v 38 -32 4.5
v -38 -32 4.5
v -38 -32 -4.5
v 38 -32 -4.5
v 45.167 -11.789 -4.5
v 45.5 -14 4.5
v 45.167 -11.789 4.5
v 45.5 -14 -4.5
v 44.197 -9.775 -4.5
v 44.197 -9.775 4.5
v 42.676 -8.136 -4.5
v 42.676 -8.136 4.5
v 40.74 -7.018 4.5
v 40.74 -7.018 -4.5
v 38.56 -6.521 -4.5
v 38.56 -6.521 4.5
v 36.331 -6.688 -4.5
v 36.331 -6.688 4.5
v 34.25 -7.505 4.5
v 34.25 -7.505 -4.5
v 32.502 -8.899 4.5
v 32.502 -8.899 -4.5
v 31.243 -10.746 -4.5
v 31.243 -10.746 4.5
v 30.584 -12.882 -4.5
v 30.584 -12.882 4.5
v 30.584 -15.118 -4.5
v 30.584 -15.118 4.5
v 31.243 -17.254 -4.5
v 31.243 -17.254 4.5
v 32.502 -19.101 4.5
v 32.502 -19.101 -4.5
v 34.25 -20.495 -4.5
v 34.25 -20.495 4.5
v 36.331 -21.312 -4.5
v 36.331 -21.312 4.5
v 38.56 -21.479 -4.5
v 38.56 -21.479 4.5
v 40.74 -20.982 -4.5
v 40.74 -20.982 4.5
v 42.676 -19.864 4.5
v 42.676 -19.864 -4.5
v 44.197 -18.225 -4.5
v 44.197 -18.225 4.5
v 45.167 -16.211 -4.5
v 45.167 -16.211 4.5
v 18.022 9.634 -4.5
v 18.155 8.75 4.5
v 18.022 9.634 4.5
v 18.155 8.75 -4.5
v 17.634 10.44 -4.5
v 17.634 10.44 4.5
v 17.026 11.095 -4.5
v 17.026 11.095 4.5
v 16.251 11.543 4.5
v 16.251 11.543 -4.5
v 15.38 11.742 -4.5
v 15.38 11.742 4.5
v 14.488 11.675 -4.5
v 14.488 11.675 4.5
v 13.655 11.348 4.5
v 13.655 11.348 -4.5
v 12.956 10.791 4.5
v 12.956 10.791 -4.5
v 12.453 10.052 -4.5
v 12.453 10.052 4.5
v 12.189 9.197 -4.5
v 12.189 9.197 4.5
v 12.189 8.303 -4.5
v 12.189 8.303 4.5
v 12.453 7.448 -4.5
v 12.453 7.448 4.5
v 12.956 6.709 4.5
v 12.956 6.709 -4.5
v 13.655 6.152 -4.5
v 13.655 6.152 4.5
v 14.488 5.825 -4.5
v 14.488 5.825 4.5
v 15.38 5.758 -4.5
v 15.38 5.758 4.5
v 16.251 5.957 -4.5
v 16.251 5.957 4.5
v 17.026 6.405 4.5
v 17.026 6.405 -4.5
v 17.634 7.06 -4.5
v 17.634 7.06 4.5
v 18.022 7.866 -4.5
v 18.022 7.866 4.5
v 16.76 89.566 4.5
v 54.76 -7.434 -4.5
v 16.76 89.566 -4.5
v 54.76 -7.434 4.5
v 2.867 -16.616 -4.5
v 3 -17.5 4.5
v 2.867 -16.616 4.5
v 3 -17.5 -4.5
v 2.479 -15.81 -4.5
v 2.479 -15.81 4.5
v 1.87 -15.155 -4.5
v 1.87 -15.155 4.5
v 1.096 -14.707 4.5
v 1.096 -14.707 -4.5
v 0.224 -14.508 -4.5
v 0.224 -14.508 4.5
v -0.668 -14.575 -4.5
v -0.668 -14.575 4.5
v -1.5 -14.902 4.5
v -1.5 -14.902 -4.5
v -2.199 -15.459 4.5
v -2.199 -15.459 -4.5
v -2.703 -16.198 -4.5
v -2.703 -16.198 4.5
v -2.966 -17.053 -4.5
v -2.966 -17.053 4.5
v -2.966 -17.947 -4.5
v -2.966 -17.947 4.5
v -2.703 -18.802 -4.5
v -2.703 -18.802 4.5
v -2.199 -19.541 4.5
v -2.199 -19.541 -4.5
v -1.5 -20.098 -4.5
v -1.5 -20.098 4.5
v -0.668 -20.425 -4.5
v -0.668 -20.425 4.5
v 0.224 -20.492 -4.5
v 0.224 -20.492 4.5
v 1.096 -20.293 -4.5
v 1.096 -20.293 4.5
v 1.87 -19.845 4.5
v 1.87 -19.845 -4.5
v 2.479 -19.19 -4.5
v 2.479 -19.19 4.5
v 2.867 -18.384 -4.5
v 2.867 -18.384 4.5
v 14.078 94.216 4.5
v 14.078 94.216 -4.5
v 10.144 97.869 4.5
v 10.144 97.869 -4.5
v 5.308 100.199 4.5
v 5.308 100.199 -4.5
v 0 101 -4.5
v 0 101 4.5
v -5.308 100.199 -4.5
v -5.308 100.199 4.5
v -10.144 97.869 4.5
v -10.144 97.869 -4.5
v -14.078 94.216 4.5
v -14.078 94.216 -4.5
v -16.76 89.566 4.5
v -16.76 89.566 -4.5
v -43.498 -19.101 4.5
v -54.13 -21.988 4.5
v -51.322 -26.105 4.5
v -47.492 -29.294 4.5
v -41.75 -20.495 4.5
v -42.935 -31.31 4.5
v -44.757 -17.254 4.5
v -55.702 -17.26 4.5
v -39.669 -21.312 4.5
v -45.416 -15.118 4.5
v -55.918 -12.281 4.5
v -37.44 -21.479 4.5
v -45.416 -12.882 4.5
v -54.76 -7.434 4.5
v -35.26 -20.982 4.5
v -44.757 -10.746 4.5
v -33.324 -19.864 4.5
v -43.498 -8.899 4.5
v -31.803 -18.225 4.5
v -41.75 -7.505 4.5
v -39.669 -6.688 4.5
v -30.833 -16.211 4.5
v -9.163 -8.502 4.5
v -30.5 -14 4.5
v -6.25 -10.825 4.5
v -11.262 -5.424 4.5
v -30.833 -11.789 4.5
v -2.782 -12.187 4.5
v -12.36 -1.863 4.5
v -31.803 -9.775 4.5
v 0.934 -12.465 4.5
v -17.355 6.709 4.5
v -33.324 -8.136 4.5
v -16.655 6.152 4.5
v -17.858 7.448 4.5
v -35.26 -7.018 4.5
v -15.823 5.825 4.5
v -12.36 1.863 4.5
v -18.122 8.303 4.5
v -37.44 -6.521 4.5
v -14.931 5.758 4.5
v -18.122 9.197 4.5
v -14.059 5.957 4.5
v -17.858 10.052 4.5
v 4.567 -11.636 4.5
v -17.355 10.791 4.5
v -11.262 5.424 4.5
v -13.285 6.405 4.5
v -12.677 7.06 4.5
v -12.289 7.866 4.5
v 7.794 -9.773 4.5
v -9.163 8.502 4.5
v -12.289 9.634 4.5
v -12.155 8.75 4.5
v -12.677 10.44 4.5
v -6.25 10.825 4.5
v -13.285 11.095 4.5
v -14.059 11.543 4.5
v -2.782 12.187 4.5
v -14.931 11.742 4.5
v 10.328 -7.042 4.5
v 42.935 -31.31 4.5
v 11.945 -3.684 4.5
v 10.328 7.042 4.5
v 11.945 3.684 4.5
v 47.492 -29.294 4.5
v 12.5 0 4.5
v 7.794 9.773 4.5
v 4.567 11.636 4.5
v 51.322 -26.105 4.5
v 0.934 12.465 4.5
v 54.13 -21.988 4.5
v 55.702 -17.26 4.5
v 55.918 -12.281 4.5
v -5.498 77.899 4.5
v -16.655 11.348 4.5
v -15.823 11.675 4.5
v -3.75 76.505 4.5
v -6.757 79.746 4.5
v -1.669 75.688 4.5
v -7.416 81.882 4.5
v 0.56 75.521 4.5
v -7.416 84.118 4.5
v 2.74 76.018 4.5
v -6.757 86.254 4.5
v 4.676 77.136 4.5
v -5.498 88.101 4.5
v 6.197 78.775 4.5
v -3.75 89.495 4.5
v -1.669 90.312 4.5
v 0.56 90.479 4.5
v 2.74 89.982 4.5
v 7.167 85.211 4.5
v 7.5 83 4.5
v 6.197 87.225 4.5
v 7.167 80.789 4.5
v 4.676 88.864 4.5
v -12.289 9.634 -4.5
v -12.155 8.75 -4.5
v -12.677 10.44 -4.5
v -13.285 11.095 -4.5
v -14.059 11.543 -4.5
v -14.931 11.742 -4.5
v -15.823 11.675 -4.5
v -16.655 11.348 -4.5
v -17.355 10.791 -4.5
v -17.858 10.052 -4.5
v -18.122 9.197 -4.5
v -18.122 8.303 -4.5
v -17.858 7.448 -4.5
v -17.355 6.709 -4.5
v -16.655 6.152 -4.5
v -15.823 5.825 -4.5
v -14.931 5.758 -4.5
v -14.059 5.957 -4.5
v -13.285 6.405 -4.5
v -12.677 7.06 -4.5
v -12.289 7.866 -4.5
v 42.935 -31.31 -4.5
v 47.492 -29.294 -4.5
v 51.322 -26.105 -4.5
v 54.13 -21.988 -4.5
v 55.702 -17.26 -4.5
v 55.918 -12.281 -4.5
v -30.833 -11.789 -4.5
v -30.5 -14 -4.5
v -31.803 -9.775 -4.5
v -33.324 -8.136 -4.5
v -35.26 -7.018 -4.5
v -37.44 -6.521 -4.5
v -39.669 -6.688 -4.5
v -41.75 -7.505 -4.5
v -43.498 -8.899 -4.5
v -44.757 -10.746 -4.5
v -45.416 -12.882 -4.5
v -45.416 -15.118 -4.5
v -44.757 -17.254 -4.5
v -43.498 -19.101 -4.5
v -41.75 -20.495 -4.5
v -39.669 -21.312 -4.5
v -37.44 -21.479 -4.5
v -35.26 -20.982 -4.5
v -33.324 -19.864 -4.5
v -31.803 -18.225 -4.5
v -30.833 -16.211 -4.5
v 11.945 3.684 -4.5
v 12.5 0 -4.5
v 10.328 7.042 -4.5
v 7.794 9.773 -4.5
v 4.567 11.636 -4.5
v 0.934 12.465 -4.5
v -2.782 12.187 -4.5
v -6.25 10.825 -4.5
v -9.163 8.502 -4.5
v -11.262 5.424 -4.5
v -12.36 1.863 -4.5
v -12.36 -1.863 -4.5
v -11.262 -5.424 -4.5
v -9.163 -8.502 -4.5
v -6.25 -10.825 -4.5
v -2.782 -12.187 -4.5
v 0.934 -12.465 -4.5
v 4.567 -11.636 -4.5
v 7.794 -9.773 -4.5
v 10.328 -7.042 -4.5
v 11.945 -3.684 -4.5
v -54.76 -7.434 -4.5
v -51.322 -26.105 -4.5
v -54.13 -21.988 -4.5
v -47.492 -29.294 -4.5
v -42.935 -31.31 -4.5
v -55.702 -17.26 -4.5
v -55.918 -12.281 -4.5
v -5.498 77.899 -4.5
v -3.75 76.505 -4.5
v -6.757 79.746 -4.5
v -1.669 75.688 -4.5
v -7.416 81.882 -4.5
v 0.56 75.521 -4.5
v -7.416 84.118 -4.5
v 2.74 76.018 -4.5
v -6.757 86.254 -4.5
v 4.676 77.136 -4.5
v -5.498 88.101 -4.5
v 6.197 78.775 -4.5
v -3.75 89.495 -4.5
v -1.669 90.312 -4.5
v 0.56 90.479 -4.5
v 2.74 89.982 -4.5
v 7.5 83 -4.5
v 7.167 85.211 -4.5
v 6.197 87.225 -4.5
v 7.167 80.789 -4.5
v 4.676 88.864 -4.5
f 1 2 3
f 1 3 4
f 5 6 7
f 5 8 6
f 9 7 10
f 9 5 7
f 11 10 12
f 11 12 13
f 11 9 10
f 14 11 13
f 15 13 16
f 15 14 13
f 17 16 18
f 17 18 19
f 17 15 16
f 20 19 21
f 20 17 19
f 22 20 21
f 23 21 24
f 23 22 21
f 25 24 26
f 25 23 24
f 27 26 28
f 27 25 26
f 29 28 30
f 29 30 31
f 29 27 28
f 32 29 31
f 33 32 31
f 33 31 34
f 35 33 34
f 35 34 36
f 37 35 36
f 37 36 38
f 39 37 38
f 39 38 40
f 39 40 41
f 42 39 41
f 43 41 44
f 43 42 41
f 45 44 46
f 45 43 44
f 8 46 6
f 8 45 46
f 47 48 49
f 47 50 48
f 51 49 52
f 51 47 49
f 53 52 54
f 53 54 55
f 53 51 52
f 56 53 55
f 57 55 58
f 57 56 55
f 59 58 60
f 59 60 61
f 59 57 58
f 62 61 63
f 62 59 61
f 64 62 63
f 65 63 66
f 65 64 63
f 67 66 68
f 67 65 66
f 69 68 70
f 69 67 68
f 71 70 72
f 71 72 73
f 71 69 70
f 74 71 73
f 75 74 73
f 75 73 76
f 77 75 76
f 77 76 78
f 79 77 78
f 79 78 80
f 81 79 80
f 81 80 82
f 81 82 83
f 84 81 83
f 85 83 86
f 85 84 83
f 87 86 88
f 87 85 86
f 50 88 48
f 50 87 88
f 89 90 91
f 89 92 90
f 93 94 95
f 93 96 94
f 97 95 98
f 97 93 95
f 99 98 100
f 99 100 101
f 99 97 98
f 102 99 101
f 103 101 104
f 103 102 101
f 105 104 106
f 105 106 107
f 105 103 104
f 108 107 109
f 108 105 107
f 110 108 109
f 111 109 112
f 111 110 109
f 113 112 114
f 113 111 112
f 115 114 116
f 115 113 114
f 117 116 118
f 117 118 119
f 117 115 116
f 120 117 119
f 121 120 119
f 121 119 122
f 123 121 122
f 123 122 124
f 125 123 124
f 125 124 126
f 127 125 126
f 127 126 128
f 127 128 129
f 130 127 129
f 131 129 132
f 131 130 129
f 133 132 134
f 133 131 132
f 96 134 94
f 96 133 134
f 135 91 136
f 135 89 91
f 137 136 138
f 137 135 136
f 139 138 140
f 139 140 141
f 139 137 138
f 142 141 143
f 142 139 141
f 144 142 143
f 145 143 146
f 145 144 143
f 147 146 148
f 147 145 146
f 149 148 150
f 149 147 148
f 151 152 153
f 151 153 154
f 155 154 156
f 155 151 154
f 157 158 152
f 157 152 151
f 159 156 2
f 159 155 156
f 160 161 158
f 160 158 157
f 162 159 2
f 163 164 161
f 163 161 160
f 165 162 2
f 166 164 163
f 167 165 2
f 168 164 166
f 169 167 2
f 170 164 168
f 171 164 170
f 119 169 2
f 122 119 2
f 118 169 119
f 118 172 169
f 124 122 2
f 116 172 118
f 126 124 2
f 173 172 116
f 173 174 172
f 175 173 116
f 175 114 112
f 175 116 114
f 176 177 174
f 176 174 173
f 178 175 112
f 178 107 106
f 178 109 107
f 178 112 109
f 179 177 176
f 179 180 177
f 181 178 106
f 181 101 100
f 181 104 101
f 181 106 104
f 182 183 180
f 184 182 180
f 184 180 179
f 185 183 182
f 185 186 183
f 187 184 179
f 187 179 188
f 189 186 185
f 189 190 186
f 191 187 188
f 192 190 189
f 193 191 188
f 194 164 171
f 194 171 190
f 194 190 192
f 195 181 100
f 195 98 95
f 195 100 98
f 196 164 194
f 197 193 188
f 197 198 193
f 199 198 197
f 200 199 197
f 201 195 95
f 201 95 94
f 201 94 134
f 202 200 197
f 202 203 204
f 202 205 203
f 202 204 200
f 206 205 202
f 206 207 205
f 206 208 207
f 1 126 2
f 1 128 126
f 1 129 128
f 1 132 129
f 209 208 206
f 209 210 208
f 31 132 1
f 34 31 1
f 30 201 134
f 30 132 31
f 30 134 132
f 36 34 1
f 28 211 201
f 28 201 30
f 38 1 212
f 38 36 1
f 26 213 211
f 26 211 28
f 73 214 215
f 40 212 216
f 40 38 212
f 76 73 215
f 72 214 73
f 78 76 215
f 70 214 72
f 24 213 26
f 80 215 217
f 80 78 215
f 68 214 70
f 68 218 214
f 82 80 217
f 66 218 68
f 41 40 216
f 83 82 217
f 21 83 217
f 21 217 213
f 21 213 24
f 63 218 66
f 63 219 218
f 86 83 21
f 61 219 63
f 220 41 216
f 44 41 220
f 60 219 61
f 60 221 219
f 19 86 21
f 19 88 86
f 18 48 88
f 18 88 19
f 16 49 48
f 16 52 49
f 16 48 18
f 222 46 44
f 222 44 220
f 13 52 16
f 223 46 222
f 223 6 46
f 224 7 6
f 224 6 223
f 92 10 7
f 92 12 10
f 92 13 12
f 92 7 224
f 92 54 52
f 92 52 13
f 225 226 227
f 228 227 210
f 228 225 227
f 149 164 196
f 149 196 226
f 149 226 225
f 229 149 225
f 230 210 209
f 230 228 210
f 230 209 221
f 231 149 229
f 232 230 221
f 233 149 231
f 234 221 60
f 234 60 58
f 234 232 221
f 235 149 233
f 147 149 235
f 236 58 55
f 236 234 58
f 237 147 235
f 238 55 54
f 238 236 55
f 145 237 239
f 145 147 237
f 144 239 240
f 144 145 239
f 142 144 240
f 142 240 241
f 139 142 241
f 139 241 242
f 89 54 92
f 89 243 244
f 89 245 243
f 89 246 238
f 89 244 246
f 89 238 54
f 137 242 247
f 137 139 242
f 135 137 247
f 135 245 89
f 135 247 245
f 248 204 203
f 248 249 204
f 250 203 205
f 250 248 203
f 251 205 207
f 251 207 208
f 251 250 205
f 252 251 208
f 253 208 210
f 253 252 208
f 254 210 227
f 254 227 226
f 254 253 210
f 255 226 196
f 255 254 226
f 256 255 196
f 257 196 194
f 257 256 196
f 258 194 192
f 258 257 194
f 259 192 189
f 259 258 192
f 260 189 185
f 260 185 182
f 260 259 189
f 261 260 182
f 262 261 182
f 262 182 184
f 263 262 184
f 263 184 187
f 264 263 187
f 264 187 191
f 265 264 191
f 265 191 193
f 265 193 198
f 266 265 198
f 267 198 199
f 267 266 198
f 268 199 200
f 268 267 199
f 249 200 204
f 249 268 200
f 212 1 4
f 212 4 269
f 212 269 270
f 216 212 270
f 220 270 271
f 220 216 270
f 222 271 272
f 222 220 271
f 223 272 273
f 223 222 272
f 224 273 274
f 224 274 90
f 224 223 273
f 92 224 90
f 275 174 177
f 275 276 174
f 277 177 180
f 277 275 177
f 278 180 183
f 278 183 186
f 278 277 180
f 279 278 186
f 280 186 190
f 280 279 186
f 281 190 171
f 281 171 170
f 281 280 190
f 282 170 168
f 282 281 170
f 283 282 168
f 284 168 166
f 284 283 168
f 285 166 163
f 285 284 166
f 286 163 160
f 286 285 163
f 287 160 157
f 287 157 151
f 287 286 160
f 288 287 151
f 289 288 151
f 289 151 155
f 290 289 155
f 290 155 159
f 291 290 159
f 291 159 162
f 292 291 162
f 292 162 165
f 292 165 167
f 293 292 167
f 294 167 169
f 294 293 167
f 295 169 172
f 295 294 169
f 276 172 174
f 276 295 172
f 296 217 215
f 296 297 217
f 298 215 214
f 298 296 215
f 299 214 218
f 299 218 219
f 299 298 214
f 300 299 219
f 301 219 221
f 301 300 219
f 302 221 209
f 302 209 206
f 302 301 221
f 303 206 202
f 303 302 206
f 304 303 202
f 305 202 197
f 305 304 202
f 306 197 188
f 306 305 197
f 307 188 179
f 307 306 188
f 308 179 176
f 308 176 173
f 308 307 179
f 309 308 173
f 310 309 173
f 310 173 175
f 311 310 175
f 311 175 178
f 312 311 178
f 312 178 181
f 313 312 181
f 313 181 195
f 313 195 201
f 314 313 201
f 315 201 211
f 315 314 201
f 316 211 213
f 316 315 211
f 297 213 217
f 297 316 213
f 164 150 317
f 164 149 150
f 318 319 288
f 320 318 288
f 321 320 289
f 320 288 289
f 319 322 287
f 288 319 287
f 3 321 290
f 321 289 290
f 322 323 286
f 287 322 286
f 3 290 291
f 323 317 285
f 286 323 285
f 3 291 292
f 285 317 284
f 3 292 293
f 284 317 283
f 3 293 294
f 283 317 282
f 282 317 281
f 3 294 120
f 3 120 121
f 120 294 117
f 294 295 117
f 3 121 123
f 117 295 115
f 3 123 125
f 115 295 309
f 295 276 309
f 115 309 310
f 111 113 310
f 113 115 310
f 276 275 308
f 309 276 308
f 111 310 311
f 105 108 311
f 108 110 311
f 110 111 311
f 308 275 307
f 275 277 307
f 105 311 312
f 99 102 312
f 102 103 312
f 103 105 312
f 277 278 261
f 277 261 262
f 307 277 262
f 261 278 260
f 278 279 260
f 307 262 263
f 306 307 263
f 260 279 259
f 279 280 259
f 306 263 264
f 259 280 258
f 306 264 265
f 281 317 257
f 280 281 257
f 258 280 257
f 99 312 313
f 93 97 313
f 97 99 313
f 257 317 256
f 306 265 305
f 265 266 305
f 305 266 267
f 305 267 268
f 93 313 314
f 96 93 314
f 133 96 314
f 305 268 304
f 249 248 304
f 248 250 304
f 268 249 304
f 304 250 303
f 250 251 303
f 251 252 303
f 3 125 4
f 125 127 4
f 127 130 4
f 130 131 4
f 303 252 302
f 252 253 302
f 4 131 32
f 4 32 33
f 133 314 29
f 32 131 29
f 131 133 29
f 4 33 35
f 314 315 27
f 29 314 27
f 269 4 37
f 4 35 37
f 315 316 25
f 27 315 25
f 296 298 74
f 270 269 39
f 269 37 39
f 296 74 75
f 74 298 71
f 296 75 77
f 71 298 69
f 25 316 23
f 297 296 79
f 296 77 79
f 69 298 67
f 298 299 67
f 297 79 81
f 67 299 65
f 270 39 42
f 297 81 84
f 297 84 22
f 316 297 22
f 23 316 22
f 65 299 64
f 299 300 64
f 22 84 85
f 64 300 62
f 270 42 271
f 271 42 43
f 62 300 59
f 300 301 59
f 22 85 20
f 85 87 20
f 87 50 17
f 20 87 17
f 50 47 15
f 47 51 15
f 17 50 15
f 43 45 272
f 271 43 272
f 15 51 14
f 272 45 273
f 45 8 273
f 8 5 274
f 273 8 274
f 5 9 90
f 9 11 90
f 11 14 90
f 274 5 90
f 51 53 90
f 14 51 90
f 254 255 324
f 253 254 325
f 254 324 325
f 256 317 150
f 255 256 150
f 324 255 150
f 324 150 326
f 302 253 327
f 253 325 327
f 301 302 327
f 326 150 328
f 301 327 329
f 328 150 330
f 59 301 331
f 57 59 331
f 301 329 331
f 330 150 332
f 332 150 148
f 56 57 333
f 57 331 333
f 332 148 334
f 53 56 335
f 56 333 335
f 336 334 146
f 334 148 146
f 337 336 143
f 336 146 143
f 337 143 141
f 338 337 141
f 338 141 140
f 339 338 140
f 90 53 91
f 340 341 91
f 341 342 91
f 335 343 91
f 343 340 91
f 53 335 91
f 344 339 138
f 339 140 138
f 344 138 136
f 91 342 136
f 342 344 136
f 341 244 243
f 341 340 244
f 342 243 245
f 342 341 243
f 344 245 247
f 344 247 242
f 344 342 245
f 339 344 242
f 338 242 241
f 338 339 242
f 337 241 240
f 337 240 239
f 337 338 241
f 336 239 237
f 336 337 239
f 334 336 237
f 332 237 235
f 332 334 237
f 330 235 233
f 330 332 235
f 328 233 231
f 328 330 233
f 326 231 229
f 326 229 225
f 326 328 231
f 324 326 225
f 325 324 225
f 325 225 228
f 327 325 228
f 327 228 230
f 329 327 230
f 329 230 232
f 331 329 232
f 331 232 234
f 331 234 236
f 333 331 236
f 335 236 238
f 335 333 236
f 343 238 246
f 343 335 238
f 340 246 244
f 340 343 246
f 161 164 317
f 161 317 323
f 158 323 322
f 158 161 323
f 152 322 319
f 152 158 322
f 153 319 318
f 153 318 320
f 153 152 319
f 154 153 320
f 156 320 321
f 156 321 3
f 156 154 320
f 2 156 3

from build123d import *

# Parameters (mm, degrees)
ESBO_O1_R                = 12.5
ESBO_O1_R_2              = 7.5
ESBO_O1_R_3              = 3
RESSALTO_EXTRUS_O2_DEPTH = 4.5


with BuildPart() as part:
    # Esboço1 → Ressalto-extrusão2 (new, symmetric)
    with BuildSketch(Plane.XY):
        with BuildLine():
            Line((-16.759819531, 89.565702497), (-54.759819531, -7.434297503))
            ThreePointArc((-54.759819531, -7.434297503), (-52.869139937, -24.144391432), (-38, -32))
            Line((-38, -32), (38, -32))
            ThreePointArc((38, -32), (52.869139937, -24.144391432), (54.759819531, -7.434297503))
            Line((54.759819531, -7.434297503), (16.759819531, 89.565702497))
            ThreePointArc((16.759819531, 89.565702497), (0, 101), (-16.759819531, 89.565702497))
        make_face()
        Circle(ESBO_O1_R, mode=Mode.SUBTRACT)
        with Locations((0, 83)):
            Circle(ESBO_O1_R_2, mode=Mode.SUBTRACT)
        with Locations((38, -14)):
            Circle(ESBO_O1_R_2, mode=Mode.SUBTRACT)
        with Locations((-38, -14)):
            Circle(ESBO_O1_R_2, mode=Mode.SUBTRACT)
        with Locations((0, -17.5)):
            Circle(ESBO_O1_R_3, mode=Mode.SUBTRACT)
        with Locations((15.155444566, 8.75)):
            Circle(ESBO_O1_R_3, mode=Mode.SUBTRACT)
        with Locations((-15.155444566, 8.75)):
            Circle(ESBO_O1_R_3, mode=Mode.SUBTRACT)
    extrude(amount=RESSALTO_EXTRUS_O2_DEPTH, both=True)


solid = part.part
